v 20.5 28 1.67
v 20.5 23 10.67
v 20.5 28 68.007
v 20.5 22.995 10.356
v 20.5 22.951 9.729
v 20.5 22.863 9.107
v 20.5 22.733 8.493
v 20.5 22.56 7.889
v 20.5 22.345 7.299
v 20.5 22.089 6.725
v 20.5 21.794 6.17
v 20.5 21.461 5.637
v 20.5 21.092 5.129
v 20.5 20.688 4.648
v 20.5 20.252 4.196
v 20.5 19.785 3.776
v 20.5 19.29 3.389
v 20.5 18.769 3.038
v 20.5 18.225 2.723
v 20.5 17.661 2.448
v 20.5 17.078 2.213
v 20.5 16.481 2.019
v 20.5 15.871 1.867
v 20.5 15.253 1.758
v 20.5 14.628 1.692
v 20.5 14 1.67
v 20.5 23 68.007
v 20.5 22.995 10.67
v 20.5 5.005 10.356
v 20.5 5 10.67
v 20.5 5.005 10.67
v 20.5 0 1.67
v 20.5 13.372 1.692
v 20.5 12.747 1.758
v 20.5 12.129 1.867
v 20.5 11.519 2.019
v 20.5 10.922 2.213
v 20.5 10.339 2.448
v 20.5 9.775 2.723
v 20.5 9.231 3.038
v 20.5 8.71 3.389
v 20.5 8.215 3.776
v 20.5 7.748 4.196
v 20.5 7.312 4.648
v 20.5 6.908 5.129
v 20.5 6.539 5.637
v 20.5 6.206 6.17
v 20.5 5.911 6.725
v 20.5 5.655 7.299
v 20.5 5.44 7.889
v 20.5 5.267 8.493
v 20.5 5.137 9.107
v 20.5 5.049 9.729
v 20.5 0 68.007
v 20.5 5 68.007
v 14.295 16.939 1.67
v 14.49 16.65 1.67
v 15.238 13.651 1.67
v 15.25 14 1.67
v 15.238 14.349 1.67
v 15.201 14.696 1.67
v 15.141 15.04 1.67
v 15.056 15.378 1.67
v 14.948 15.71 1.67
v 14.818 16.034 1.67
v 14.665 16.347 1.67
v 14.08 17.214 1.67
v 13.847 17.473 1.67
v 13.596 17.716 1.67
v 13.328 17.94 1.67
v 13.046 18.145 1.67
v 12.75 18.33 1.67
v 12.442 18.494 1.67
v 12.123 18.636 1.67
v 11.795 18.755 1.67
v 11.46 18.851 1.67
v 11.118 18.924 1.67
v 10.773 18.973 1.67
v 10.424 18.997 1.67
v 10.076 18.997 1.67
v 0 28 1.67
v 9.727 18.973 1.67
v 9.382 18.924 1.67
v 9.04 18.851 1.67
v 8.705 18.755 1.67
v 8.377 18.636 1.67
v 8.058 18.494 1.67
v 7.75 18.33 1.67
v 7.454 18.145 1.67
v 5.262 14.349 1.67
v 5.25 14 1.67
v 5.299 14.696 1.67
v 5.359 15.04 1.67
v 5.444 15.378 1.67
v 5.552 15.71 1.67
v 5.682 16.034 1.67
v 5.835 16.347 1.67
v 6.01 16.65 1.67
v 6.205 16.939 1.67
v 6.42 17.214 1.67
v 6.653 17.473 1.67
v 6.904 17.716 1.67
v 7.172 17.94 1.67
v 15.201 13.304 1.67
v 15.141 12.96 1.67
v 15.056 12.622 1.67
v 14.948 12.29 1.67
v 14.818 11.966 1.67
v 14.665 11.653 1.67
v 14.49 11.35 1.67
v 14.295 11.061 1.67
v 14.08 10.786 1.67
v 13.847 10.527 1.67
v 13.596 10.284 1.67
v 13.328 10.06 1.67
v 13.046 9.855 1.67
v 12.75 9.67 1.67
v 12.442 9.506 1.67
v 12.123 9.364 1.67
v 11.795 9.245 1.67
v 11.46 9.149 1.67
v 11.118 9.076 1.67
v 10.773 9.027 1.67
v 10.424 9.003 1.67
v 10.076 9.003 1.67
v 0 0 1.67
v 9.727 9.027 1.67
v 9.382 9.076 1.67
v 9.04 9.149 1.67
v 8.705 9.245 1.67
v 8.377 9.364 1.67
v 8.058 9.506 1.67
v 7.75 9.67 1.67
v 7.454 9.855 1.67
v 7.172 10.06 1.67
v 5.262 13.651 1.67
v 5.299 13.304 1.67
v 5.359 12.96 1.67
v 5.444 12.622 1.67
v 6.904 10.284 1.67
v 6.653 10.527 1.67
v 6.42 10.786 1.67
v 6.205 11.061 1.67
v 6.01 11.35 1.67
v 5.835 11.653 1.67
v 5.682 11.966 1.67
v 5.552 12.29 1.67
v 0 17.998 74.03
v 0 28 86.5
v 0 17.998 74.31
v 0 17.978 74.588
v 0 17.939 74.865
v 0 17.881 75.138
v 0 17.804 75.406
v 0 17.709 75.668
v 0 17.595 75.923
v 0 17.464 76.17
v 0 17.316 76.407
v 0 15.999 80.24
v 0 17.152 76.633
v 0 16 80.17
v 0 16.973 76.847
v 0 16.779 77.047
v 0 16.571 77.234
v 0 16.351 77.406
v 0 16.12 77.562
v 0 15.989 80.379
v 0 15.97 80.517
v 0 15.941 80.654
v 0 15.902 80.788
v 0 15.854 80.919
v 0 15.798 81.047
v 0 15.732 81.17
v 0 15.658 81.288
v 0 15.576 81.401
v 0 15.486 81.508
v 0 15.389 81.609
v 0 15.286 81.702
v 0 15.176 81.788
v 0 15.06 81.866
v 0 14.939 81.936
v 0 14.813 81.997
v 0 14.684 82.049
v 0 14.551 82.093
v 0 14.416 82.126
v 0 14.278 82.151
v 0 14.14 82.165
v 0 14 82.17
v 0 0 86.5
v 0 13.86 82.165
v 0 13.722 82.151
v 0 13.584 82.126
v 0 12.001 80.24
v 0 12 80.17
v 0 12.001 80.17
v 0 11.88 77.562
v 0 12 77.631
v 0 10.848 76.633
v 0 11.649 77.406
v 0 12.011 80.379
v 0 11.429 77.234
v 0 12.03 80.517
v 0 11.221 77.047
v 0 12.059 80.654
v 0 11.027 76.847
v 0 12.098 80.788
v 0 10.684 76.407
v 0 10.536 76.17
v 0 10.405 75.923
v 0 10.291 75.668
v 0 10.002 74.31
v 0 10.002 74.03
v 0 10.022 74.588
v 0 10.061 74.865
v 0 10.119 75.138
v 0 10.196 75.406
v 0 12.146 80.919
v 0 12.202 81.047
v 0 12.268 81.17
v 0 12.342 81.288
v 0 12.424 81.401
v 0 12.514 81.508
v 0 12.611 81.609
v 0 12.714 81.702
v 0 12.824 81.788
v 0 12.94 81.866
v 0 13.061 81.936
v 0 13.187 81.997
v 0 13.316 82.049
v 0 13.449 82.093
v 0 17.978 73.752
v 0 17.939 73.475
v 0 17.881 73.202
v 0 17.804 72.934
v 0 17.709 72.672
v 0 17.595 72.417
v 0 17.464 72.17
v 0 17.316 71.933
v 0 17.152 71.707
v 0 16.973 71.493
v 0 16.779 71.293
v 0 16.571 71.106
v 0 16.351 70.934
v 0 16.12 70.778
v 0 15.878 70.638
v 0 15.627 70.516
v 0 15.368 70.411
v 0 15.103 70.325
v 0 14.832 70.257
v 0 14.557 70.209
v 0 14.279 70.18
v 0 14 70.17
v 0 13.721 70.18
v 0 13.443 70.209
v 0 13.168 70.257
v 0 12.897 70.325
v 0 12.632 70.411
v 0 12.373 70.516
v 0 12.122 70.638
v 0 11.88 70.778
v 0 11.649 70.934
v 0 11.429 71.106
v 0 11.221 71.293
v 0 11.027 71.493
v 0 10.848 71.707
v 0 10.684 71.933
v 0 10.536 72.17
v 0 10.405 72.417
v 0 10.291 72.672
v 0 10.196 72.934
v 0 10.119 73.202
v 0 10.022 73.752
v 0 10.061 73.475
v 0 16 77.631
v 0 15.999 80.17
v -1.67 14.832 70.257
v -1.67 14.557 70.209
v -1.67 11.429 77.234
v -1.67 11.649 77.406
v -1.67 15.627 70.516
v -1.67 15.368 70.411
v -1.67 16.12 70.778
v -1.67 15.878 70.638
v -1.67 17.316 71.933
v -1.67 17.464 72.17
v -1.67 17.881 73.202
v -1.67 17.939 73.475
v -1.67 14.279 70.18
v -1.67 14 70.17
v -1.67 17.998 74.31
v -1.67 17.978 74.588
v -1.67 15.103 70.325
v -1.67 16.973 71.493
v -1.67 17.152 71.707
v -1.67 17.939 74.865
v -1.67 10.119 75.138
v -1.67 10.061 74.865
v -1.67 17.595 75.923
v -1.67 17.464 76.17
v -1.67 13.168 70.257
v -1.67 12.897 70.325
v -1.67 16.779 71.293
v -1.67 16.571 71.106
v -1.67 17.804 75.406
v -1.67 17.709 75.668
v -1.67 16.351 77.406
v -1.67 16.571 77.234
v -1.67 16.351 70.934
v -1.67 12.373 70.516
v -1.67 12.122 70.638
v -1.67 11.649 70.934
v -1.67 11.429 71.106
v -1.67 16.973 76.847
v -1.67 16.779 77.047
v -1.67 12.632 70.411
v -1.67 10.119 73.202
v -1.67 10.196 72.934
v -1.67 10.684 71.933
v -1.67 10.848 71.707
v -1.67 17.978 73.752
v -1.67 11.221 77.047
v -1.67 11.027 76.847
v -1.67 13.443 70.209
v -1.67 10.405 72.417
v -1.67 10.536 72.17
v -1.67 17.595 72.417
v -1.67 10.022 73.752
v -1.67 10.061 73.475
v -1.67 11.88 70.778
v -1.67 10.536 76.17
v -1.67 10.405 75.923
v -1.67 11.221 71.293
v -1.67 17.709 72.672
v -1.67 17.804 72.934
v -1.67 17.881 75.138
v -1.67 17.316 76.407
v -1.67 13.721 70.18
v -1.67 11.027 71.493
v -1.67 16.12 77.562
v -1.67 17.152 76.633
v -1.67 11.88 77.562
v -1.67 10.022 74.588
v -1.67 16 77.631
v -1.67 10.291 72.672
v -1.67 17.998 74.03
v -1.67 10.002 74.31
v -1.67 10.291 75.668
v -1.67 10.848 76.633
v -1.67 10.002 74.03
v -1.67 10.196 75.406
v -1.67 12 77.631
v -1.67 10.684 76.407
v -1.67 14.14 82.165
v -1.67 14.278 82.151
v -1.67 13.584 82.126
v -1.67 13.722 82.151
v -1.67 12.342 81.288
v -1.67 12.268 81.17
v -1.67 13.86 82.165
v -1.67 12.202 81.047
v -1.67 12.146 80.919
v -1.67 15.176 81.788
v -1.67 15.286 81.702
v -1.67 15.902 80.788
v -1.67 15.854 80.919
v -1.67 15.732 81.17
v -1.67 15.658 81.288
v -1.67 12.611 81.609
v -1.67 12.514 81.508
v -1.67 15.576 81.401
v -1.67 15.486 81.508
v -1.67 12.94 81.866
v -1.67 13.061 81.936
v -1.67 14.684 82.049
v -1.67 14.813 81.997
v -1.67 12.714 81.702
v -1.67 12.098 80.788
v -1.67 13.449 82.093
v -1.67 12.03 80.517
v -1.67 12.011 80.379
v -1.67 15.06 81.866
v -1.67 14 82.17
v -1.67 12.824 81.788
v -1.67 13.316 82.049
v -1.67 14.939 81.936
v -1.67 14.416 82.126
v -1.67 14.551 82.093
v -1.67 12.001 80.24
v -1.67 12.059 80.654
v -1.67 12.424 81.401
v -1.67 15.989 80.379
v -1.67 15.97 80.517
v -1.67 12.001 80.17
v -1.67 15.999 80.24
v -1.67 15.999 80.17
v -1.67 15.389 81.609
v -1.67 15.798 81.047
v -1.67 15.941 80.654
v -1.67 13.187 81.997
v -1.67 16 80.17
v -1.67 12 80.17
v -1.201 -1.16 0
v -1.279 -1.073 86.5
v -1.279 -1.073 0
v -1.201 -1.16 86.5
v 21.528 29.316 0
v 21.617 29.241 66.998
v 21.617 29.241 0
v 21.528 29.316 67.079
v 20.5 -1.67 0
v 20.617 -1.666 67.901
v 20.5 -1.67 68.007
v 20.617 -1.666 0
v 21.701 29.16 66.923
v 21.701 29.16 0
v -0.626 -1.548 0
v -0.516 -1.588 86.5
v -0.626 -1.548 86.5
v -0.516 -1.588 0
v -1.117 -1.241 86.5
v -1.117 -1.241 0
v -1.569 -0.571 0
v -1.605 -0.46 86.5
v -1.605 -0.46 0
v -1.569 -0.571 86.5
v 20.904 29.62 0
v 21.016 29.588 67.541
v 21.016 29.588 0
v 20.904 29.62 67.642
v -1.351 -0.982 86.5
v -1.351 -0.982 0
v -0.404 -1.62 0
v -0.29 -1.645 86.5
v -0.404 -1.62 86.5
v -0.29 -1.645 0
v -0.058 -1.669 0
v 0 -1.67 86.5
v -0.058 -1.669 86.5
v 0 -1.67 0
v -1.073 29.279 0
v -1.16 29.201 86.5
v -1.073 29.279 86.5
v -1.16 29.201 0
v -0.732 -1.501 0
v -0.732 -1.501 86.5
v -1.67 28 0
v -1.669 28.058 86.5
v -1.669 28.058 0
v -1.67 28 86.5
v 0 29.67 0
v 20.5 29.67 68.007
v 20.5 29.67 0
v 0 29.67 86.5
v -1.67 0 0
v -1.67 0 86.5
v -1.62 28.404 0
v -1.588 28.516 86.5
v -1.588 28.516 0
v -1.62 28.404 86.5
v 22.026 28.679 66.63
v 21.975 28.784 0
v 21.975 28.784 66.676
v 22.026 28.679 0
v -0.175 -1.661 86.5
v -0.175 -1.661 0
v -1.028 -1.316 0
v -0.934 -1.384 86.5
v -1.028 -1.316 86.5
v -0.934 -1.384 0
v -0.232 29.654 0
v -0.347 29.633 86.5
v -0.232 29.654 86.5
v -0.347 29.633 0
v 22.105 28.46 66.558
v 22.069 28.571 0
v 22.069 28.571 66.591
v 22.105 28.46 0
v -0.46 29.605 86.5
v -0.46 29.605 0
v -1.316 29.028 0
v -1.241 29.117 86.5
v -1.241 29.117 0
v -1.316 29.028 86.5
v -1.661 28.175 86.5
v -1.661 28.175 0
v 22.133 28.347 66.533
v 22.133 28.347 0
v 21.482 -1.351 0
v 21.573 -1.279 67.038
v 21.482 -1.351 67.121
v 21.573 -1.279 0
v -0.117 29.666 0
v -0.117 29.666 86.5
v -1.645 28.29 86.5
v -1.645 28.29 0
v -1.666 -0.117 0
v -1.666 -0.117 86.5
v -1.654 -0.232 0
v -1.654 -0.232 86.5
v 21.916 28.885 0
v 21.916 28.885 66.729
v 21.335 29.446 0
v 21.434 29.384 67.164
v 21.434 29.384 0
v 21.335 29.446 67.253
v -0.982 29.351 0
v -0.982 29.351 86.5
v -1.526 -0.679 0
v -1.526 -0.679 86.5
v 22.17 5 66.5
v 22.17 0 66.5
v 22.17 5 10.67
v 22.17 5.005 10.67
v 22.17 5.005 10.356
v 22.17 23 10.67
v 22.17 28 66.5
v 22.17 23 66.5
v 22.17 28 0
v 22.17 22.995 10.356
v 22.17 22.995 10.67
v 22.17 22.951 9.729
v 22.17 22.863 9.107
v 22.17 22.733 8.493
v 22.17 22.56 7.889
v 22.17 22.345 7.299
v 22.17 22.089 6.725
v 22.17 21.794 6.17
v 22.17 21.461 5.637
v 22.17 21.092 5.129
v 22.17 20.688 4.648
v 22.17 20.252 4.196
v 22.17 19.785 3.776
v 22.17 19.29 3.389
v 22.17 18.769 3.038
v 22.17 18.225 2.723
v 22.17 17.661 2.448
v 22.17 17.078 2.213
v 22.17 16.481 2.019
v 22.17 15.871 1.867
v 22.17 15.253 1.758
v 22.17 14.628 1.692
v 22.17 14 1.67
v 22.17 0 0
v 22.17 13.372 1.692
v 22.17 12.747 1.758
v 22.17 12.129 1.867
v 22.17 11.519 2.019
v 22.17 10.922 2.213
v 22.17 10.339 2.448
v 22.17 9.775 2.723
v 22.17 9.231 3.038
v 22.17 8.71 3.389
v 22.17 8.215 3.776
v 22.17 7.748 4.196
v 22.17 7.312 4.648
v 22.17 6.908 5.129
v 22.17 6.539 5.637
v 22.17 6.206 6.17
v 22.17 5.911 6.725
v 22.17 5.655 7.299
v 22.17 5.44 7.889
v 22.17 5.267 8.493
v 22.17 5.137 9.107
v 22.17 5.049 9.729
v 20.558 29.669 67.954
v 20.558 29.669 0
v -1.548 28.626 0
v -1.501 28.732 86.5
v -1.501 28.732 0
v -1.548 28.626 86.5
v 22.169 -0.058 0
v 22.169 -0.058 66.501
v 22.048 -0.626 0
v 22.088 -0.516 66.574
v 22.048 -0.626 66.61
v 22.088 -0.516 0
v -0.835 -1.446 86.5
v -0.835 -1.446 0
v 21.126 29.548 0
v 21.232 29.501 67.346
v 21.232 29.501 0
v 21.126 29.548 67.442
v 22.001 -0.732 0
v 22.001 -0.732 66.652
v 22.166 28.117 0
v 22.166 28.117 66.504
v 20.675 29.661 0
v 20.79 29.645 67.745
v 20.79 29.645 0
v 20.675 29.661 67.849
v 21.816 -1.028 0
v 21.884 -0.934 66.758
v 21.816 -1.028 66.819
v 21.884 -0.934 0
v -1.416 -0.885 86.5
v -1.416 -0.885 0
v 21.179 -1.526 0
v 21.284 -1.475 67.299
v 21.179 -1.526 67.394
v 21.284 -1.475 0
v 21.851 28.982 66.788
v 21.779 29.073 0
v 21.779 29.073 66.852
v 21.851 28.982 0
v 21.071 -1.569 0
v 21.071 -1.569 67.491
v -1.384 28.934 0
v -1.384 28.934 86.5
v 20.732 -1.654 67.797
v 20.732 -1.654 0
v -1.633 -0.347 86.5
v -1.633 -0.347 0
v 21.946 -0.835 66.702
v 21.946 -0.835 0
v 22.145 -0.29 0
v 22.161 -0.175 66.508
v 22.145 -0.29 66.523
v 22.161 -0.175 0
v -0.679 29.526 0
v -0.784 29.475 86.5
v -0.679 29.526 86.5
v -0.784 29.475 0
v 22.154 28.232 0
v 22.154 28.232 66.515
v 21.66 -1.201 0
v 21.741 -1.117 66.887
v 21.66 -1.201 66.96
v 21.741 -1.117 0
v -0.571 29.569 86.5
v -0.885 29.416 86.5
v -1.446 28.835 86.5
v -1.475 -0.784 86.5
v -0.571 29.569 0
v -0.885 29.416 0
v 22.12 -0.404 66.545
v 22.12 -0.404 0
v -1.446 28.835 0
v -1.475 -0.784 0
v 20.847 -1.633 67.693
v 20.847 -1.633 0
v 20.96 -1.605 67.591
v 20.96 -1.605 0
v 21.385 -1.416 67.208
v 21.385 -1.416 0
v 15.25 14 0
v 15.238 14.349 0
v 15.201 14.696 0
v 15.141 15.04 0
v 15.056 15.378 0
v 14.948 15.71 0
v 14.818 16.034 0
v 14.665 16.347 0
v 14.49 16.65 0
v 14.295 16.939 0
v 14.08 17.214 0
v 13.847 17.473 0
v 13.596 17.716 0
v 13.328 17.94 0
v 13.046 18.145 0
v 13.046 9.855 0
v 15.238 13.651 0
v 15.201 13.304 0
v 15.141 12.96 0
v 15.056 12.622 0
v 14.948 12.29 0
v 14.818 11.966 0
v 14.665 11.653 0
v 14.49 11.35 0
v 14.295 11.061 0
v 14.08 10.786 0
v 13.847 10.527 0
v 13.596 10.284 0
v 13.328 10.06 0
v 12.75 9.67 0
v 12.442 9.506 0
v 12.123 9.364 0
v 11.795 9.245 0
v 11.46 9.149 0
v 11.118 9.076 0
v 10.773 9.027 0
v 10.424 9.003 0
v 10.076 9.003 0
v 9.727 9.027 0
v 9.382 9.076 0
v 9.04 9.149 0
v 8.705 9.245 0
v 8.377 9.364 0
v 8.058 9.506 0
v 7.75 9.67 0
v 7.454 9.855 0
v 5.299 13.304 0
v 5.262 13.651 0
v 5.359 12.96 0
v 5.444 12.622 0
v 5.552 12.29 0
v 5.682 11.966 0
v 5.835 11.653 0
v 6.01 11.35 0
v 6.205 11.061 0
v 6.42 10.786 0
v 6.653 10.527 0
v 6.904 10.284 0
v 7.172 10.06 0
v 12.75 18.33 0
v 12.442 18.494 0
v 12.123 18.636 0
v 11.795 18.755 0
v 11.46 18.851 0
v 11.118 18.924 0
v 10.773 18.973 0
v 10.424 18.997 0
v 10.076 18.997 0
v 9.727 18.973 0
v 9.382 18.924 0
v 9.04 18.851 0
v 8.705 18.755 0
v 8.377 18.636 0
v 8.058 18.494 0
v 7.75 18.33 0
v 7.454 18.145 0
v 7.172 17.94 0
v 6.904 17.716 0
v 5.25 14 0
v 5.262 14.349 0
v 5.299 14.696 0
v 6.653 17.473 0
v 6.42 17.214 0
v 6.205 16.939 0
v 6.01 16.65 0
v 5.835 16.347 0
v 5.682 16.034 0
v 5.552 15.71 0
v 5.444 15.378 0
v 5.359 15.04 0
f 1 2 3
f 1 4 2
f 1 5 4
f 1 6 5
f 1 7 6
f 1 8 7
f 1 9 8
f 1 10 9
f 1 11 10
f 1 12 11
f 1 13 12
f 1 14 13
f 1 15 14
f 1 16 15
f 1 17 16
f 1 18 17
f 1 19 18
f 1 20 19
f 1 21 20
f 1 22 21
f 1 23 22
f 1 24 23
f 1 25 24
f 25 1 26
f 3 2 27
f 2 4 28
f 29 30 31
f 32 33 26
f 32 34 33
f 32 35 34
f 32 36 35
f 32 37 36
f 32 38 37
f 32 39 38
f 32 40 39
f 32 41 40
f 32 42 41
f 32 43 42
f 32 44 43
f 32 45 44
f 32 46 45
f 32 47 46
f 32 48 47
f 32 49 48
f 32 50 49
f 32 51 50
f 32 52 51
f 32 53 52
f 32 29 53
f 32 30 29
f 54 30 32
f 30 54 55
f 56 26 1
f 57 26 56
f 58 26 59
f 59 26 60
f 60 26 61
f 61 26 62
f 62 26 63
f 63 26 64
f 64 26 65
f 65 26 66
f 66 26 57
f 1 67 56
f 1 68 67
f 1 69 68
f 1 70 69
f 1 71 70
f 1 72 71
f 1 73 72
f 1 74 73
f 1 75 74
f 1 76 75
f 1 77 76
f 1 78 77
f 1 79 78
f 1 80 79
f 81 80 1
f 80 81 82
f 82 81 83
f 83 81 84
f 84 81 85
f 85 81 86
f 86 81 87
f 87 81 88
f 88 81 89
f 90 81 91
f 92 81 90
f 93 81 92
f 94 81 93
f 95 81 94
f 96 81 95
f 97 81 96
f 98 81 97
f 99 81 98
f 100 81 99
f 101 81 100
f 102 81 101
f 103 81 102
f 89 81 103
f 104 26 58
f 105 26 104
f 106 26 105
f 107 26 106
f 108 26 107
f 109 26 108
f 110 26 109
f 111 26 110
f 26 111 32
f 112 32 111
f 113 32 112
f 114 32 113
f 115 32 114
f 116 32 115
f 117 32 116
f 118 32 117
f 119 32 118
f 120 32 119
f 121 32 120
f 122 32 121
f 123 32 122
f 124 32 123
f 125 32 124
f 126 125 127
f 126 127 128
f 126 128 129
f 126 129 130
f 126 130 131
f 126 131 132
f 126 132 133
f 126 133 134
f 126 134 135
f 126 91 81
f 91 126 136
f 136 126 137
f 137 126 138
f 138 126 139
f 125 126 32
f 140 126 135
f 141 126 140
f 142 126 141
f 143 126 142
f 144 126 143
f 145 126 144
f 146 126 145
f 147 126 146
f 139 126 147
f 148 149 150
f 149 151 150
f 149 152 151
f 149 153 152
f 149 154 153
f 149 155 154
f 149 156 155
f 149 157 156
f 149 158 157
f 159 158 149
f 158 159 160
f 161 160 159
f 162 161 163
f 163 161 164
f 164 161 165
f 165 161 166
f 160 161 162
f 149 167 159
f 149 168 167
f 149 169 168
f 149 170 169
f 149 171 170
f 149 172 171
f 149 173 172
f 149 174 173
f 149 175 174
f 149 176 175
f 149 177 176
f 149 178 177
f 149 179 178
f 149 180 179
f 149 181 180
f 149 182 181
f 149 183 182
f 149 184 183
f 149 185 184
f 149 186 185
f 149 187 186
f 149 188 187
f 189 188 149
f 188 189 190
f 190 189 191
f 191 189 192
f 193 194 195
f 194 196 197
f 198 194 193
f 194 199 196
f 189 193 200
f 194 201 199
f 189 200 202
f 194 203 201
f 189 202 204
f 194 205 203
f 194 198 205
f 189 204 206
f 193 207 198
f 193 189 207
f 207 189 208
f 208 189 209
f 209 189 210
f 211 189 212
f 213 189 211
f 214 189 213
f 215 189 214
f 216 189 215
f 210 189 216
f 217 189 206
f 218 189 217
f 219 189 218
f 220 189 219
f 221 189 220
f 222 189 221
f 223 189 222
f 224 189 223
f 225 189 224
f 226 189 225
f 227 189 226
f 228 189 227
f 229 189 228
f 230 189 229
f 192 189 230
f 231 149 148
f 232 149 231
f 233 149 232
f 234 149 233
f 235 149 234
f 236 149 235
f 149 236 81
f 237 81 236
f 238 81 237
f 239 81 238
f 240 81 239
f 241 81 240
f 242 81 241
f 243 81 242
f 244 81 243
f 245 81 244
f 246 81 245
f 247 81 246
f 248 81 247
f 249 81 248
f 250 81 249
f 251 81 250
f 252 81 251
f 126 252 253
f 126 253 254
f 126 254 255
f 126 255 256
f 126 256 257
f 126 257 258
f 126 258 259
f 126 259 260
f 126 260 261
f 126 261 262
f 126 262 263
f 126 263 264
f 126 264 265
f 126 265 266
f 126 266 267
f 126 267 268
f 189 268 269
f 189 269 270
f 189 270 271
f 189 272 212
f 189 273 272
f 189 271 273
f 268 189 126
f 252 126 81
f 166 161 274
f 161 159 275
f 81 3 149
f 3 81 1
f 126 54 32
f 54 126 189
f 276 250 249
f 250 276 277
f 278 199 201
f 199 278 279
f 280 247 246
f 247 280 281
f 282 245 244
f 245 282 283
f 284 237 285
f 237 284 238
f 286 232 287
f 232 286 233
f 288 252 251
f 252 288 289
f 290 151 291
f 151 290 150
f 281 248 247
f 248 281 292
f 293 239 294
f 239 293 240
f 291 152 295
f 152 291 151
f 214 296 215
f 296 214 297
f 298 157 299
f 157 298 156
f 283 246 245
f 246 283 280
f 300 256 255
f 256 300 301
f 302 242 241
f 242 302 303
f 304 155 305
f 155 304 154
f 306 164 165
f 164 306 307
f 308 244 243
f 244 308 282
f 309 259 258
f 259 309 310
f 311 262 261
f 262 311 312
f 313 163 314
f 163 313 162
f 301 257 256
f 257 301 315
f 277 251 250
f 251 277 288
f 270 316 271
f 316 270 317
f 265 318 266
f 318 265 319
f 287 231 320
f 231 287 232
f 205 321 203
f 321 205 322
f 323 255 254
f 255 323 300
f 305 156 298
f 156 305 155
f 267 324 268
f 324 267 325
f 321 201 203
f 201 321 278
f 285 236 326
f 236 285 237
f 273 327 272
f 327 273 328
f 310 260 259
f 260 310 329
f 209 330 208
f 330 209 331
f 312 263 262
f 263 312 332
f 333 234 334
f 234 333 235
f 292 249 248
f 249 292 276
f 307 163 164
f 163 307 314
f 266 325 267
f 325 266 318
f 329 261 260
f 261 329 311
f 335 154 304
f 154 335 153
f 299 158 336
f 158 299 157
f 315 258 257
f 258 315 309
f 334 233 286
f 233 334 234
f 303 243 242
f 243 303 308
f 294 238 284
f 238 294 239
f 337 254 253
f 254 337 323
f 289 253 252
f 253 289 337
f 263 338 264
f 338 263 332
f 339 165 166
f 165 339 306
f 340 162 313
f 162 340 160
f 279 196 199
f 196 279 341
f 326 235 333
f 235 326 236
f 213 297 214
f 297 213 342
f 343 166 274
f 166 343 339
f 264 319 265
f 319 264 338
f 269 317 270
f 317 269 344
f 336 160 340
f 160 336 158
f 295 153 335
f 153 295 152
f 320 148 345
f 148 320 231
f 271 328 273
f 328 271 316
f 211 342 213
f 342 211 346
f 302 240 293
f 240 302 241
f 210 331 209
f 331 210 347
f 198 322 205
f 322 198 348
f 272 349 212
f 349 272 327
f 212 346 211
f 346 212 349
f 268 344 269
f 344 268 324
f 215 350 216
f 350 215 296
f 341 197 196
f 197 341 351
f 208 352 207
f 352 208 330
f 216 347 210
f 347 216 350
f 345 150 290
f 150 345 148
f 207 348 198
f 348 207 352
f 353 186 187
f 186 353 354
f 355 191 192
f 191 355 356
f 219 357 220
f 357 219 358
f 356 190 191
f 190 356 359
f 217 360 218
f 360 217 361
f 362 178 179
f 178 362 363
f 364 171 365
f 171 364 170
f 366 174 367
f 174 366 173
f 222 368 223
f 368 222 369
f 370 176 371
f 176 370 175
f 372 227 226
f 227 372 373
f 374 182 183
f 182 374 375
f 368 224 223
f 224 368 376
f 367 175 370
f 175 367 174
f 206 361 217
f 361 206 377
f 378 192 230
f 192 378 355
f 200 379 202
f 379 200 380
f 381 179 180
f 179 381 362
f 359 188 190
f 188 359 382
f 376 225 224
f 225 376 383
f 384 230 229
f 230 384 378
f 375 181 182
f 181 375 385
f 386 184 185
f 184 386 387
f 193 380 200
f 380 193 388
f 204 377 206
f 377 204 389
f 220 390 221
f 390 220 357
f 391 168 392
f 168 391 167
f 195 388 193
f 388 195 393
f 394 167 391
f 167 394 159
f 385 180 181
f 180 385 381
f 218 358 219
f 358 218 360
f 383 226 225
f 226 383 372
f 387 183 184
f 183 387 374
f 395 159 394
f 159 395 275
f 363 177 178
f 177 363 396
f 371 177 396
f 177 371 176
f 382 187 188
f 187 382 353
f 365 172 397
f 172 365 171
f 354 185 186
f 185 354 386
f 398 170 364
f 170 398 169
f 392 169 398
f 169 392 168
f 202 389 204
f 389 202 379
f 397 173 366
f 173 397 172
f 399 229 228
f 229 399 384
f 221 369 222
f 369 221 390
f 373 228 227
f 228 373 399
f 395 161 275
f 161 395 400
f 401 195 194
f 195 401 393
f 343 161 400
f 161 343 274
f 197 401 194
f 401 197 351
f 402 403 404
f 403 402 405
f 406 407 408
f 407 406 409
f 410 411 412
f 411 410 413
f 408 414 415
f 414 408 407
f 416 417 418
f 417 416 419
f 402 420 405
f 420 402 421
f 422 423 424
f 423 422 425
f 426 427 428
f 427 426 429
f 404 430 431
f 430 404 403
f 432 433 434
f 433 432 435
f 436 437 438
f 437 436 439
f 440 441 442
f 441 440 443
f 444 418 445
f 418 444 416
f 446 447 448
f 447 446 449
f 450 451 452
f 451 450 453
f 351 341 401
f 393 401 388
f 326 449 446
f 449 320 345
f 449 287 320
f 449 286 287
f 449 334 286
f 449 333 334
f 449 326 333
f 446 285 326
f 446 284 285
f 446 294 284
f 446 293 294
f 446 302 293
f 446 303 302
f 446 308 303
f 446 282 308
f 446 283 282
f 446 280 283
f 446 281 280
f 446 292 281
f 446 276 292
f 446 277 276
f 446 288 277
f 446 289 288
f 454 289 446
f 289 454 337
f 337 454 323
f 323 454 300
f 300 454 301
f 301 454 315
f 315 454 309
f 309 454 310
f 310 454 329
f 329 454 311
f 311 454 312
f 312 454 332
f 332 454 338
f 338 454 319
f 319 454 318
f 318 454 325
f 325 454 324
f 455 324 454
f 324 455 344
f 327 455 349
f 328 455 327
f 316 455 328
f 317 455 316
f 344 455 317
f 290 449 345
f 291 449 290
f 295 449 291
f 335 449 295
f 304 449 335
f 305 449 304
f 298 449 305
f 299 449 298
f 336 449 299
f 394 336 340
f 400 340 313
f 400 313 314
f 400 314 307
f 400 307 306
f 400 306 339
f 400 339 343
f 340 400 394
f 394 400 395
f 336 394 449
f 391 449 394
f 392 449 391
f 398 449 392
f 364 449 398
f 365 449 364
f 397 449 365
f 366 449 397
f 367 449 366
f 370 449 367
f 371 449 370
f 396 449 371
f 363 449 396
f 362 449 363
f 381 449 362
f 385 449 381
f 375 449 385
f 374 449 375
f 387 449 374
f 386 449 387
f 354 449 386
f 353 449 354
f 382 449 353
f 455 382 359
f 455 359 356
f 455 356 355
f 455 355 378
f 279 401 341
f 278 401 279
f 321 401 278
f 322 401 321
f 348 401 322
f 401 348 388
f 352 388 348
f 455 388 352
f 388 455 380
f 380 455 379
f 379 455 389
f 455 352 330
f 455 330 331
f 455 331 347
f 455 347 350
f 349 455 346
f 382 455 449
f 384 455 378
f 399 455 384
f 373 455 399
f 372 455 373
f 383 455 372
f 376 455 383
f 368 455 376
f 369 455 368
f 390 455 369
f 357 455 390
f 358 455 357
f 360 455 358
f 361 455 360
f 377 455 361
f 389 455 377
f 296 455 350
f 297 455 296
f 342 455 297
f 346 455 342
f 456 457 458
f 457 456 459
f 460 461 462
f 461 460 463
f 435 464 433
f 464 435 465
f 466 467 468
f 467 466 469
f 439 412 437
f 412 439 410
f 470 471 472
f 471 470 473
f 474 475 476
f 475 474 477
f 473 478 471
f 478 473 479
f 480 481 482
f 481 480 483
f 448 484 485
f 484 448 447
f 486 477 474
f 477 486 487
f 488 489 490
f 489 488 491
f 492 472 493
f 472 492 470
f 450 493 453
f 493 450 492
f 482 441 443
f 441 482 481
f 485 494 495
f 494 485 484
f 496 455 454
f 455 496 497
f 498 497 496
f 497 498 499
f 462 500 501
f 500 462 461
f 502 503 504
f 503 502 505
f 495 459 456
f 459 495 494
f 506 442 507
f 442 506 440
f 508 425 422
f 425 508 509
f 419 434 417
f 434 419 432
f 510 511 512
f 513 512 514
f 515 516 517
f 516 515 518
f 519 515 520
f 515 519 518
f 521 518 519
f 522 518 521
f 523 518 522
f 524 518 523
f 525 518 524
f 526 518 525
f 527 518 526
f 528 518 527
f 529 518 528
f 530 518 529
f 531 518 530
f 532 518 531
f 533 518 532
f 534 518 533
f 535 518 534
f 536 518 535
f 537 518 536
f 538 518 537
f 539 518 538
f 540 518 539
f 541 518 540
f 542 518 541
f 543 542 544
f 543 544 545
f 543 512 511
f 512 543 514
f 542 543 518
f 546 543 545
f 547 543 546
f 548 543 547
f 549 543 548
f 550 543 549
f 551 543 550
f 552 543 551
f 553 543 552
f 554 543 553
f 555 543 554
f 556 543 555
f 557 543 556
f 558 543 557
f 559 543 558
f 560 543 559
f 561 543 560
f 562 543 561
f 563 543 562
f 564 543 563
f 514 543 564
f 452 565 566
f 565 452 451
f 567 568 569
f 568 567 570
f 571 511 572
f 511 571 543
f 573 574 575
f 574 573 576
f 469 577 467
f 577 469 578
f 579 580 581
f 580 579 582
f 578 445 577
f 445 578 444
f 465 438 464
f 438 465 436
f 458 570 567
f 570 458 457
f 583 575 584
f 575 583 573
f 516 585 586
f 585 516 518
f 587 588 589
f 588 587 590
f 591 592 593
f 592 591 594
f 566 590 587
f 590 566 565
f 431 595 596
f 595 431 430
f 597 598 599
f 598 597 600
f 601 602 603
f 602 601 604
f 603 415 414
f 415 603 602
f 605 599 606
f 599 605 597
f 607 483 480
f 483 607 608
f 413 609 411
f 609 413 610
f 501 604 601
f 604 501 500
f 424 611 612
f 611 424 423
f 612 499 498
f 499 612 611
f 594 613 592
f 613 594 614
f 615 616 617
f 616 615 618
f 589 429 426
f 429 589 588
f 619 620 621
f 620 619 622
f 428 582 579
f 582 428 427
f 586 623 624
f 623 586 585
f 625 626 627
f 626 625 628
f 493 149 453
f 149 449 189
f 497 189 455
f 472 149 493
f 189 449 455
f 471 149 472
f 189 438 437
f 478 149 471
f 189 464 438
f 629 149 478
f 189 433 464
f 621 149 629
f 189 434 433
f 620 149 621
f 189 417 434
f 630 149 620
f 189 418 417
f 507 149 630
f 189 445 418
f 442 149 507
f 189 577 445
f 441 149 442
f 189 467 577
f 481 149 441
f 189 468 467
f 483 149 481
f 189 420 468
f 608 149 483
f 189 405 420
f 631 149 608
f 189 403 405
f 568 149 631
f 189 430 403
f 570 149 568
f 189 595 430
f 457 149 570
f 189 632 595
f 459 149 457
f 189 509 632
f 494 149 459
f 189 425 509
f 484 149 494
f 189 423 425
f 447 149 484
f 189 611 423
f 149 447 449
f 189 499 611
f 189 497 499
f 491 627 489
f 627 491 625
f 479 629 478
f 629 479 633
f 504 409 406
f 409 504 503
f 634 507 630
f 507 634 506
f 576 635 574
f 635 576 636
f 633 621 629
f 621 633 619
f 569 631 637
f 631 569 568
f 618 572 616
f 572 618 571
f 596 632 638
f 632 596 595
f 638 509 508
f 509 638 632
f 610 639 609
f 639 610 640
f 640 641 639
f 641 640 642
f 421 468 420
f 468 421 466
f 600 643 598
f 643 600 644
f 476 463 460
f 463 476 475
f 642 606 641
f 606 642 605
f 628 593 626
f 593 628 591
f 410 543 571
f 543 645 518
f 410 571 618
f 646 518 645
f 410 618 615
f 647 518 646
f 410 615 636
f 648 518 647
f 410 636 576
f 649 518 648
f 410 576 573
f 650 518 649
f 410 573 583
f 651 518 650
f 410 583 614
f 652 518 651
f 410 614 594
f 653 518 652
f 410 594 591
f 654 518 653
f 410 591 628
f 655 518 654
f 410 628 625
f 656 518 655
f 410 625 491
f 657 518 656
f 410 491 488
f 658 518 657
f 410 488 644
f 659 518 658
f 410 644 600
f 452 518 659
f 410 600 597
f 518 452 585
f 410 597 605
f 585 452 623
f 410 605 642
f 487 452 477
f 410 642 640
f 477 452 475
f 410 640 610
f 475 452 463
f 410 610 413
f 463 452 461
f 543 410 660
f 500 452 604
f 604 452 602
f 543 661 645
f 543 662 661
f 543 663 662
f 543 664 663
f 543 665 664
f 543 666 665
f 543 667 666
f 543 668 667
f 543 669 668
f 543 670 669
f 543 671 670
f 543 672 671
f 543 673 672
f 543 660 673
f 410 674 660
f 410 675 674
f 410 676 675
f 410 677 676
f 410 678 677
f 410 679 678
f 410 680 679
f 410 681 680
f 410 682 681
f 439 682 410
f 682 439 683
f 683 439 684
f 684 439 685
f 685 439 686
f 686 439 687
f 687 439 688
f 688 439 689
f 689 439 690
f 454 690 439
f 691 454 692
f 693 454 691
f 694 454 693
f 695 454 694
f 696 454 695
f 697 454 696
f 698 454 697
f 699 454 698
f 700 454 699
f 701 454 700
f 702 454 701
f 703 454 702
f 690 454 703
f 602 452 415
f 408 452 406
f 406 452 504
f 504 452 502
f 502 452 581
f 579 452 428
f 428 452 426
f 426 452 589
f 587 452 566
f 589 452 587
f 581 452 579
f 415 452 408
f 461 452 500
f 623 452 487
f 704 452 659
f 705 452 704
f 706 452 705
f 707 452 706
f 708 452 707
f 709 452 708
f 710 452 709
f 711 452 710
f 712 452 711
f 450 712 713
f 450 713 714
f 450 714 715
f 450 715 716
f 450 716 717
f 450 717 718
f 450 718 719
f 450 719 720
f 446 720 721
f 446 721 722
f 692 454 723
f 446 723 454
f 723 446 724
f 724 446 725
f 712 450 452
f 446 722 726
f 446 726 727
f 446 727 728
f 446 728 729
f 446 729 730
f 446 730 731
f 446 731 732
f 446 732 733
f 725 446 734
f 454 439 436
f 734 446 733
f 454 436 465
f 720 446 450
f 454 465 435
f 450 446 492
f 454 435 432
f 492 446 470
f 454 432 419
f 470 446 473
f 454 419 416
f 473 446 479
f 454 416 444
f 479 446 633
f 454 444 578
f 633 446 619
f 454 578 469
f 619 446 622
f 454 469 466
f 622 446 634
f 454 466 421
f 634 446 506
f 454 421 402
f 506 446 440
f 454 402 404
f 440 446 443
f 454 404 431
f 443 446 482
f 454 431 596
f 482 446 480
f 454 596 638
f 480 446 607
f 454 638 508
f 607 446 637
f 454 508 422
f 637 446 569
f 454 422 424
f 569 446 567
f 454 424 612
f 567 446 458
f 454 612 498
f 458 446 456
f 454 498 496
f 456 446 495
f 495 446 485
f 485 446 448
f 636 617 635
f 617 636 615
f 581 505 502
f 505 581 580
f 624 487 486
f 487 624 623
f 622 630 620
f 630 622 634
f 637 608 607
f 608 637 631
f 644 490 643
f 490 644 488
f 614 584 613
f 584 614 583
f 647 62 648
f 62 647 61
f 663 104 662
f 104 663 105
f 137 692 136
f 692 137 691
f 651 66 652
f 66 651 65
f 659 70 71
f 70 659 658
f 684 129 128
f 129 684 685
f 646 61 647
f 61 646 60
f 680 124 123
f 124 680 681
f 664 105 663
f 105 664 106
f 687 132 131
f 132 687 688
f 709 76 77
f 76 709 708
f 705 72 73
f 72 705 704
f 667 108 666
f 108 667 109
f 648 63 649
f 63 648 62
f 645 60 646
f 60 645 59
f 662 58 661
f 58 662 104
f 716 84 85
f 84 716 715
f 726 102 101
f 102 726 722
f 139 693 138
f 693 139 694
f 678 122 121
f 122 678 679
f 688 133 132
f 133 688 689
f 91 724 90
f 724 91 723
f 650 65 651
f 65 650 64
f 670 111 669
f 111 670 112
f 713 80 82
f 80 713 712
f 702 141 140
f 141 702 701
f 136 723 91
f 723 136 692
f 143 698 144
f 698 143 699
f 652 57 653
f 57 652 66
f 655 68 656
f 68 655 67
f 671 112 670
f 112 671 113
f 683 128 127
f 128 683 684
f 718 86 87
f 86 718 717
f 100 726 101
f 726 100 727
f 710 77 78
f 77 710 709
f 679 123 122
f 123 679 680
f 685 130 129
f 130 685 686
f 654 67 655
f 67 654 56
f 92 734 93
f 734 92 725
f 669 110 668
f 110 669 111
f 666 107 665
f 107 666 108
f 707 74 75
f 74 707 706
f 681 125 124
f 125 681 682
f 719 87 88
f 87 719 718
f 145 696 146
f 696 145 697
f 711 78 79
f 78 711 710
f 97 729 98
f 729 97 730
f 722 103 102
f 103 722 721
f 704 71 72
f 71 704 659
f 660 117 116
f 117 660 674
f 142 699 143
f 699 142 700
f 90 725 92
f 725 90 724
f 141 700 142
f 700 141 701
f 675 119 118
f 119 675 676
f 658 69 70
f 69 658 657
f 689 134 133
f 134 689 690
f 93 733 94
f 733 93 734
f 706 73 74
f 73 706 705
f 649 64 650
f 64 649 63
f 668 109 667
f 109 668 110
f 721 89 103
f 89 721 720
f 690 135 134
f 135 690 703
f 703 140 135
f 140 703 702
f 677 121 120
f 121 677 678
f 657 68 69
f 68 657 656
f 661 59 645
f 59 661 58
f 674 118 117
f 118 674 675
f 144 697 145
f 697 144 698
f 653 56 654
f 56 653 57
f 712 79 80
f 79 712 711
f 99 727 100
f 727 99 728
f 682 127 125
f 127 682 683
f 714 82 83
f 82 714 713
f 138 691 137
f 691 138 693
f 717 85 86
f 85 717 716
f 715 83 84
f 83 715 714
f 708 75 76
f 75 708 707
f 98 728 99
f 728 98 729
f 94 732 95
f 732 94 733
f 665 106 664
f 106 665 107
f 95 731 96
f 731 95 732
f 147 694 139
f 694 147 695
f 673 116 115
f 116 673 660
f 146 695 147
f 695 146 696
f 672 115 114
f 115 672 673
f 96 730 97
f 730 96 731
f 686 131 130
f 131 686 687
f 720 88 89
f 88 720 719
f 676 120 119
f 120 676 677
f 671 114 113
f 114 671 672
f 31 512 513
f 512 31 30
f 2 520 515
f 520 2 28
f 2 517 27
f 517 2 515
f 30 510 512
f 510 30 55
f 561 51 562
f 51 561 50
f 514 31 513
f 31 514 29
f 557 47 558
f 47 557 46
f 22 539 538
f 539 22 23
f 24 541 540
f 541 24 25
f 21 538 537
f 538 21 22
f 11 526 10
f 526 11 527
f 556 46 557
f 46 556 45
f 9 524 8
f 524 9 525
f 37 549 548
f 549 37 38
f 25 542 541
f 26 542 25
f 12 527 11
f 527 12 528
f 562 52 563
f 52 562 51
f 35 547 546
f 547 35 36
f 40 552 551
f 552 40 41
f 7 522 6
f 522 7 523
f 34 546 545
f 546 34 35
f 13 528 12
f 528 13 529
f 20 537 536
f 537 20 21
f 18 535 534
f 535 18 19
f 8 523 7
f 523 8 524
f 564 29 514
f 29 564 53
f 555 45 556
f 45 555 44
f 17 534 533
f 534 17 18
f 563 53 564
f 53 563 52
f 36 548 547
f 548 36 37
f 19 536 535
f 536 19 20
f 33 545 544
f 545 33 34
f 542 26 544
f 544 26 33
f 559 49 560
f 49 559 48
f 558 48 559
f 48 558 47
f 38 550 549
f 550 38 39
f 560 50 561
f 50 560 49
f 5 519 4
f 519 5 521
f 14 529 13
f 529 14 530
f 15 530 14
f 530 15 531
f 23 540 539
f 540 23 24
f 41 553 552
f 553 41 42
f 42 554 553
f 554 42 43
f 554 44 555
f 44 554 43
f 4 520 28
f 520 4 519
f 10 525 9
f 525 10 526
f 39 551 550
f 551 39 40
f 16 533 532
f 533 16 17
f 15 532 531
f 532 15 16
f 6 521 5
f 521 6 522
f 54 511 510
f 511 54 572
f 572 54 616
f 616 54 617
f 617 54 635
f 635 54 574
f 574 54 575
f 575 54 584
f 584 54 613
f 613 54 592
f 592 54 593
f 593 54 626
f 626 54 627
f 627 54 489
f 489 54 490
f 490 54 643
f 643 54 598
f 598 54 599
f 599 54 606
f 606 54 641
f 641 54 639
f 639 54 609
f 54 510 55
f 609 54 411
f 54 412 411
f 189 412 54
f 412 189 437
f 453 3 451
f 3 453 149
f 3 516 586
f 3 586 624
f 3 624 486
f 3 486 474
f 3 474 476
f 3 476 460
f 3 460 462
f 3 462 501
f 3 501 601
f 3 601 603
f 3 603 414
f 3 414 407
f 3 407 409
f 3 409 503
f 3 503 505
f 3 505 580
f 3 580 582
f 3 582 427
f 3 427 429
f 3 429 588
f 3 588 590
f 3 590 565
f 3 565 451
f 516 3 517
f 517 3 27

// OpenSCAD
/*
 * SwitchBot Indoor/Outdoor Thermo-Hygrometer
 *
 * Author: Pavel Rampas
 * Version: 1.0.0 (Changelog is at the bottom)
 * License: CC BY-SA 4.0 [https://creativecommons.org/licenses/by-sa/4.0/]
 * Link: https://github.com/pavelrampas/openscad-models
 *
 * OpenSCAD version: 2021.01
 *
 * Instructions:
 * Set up parameters, render and print.
 *
 * Height is layer.
 * Thickness is perimeter.
 */

// Parameters
//------------------------------------------------------------------------------

$fn = $preview ? 15 : 90;

// Parameters that don't need to be changed
//------------------------------------------------------------------------------

thickness = 1.67;
height = 20 + 0.5;
width = 27.5 + 0.5;
length = 66 + 0.5;

holeBottomD = 10;
holeFrontWidth = 18;

holderLength = 20;
holderHoleSmall = 4;
holderHoleLarge = 8;

// Code
//------------------------------------------------------------------------------

// Box
difference() {
    // Box
    linear_extrude(length + holderLength) {
        offset(r = thickness) {
            square([height, width]);
        }
    }
    // SwitchBot
    translate([0, 0, thickness]){
        cube([height, width, length + holderLength]);
        #cube([height, width, length]);
    }
    // Hole bottom
    translate([height / 2, width / 2, 0]) {
        cylinder(h = thickness * 2, d = holeBottomD);
    }
    // Hole front
    translate([
        height,
        (width - holeFrontWidth) / 2,
        thickness + holeFrontWidth / 2
    ]) {
        cube([thickness, holeFrontWidth, length + holderLength]);
    }
    translate([height,  width / 2, (holeFrontWidth / 2) + thickness]) {
        rotate([0, 90, 0]) {
            cylinder(h = thickness, d = holeFrontWidth);
        }
    }
    // Hole holder
    translate([-thickness, 0, length + thickness + (holderHoleLarge / 2) + 2]) {
        translate([0, width / 2, 0]) {
            rotate([0, 90, 0]) {
                cylinder(h = thickness * 2, d = holderHoleLarge);
            }
        }
        translate([0, width / 2, 6]) {
            rotate([0, 90, 0]) {
                cylinder(h = thickness * 2, d = holderHoleSmall);
            }
        }
        translate([0, (width / 2) - 2, 0]) {
            cube([thickness * 2, holderHoleSmall, 6]);
        }
    }
    translate([0, width + thickness, length]) {
        rotate([90, 0, 0]) {
            linear_extrude(width + (2 * thickness)) {
                polygon([
                    [height + thickness, 0],
                    [height + thickness, holderLength],
                    [0, holderLength]
                ]);
            }
        }
    }
}

// Functions
//------------------------------------------------------------------------------

// Modules
//------------------------------------------------------------------------------

// Changelog
//------------------------------------------------------------------------------

// [1.0.0]:
// Initial release.
